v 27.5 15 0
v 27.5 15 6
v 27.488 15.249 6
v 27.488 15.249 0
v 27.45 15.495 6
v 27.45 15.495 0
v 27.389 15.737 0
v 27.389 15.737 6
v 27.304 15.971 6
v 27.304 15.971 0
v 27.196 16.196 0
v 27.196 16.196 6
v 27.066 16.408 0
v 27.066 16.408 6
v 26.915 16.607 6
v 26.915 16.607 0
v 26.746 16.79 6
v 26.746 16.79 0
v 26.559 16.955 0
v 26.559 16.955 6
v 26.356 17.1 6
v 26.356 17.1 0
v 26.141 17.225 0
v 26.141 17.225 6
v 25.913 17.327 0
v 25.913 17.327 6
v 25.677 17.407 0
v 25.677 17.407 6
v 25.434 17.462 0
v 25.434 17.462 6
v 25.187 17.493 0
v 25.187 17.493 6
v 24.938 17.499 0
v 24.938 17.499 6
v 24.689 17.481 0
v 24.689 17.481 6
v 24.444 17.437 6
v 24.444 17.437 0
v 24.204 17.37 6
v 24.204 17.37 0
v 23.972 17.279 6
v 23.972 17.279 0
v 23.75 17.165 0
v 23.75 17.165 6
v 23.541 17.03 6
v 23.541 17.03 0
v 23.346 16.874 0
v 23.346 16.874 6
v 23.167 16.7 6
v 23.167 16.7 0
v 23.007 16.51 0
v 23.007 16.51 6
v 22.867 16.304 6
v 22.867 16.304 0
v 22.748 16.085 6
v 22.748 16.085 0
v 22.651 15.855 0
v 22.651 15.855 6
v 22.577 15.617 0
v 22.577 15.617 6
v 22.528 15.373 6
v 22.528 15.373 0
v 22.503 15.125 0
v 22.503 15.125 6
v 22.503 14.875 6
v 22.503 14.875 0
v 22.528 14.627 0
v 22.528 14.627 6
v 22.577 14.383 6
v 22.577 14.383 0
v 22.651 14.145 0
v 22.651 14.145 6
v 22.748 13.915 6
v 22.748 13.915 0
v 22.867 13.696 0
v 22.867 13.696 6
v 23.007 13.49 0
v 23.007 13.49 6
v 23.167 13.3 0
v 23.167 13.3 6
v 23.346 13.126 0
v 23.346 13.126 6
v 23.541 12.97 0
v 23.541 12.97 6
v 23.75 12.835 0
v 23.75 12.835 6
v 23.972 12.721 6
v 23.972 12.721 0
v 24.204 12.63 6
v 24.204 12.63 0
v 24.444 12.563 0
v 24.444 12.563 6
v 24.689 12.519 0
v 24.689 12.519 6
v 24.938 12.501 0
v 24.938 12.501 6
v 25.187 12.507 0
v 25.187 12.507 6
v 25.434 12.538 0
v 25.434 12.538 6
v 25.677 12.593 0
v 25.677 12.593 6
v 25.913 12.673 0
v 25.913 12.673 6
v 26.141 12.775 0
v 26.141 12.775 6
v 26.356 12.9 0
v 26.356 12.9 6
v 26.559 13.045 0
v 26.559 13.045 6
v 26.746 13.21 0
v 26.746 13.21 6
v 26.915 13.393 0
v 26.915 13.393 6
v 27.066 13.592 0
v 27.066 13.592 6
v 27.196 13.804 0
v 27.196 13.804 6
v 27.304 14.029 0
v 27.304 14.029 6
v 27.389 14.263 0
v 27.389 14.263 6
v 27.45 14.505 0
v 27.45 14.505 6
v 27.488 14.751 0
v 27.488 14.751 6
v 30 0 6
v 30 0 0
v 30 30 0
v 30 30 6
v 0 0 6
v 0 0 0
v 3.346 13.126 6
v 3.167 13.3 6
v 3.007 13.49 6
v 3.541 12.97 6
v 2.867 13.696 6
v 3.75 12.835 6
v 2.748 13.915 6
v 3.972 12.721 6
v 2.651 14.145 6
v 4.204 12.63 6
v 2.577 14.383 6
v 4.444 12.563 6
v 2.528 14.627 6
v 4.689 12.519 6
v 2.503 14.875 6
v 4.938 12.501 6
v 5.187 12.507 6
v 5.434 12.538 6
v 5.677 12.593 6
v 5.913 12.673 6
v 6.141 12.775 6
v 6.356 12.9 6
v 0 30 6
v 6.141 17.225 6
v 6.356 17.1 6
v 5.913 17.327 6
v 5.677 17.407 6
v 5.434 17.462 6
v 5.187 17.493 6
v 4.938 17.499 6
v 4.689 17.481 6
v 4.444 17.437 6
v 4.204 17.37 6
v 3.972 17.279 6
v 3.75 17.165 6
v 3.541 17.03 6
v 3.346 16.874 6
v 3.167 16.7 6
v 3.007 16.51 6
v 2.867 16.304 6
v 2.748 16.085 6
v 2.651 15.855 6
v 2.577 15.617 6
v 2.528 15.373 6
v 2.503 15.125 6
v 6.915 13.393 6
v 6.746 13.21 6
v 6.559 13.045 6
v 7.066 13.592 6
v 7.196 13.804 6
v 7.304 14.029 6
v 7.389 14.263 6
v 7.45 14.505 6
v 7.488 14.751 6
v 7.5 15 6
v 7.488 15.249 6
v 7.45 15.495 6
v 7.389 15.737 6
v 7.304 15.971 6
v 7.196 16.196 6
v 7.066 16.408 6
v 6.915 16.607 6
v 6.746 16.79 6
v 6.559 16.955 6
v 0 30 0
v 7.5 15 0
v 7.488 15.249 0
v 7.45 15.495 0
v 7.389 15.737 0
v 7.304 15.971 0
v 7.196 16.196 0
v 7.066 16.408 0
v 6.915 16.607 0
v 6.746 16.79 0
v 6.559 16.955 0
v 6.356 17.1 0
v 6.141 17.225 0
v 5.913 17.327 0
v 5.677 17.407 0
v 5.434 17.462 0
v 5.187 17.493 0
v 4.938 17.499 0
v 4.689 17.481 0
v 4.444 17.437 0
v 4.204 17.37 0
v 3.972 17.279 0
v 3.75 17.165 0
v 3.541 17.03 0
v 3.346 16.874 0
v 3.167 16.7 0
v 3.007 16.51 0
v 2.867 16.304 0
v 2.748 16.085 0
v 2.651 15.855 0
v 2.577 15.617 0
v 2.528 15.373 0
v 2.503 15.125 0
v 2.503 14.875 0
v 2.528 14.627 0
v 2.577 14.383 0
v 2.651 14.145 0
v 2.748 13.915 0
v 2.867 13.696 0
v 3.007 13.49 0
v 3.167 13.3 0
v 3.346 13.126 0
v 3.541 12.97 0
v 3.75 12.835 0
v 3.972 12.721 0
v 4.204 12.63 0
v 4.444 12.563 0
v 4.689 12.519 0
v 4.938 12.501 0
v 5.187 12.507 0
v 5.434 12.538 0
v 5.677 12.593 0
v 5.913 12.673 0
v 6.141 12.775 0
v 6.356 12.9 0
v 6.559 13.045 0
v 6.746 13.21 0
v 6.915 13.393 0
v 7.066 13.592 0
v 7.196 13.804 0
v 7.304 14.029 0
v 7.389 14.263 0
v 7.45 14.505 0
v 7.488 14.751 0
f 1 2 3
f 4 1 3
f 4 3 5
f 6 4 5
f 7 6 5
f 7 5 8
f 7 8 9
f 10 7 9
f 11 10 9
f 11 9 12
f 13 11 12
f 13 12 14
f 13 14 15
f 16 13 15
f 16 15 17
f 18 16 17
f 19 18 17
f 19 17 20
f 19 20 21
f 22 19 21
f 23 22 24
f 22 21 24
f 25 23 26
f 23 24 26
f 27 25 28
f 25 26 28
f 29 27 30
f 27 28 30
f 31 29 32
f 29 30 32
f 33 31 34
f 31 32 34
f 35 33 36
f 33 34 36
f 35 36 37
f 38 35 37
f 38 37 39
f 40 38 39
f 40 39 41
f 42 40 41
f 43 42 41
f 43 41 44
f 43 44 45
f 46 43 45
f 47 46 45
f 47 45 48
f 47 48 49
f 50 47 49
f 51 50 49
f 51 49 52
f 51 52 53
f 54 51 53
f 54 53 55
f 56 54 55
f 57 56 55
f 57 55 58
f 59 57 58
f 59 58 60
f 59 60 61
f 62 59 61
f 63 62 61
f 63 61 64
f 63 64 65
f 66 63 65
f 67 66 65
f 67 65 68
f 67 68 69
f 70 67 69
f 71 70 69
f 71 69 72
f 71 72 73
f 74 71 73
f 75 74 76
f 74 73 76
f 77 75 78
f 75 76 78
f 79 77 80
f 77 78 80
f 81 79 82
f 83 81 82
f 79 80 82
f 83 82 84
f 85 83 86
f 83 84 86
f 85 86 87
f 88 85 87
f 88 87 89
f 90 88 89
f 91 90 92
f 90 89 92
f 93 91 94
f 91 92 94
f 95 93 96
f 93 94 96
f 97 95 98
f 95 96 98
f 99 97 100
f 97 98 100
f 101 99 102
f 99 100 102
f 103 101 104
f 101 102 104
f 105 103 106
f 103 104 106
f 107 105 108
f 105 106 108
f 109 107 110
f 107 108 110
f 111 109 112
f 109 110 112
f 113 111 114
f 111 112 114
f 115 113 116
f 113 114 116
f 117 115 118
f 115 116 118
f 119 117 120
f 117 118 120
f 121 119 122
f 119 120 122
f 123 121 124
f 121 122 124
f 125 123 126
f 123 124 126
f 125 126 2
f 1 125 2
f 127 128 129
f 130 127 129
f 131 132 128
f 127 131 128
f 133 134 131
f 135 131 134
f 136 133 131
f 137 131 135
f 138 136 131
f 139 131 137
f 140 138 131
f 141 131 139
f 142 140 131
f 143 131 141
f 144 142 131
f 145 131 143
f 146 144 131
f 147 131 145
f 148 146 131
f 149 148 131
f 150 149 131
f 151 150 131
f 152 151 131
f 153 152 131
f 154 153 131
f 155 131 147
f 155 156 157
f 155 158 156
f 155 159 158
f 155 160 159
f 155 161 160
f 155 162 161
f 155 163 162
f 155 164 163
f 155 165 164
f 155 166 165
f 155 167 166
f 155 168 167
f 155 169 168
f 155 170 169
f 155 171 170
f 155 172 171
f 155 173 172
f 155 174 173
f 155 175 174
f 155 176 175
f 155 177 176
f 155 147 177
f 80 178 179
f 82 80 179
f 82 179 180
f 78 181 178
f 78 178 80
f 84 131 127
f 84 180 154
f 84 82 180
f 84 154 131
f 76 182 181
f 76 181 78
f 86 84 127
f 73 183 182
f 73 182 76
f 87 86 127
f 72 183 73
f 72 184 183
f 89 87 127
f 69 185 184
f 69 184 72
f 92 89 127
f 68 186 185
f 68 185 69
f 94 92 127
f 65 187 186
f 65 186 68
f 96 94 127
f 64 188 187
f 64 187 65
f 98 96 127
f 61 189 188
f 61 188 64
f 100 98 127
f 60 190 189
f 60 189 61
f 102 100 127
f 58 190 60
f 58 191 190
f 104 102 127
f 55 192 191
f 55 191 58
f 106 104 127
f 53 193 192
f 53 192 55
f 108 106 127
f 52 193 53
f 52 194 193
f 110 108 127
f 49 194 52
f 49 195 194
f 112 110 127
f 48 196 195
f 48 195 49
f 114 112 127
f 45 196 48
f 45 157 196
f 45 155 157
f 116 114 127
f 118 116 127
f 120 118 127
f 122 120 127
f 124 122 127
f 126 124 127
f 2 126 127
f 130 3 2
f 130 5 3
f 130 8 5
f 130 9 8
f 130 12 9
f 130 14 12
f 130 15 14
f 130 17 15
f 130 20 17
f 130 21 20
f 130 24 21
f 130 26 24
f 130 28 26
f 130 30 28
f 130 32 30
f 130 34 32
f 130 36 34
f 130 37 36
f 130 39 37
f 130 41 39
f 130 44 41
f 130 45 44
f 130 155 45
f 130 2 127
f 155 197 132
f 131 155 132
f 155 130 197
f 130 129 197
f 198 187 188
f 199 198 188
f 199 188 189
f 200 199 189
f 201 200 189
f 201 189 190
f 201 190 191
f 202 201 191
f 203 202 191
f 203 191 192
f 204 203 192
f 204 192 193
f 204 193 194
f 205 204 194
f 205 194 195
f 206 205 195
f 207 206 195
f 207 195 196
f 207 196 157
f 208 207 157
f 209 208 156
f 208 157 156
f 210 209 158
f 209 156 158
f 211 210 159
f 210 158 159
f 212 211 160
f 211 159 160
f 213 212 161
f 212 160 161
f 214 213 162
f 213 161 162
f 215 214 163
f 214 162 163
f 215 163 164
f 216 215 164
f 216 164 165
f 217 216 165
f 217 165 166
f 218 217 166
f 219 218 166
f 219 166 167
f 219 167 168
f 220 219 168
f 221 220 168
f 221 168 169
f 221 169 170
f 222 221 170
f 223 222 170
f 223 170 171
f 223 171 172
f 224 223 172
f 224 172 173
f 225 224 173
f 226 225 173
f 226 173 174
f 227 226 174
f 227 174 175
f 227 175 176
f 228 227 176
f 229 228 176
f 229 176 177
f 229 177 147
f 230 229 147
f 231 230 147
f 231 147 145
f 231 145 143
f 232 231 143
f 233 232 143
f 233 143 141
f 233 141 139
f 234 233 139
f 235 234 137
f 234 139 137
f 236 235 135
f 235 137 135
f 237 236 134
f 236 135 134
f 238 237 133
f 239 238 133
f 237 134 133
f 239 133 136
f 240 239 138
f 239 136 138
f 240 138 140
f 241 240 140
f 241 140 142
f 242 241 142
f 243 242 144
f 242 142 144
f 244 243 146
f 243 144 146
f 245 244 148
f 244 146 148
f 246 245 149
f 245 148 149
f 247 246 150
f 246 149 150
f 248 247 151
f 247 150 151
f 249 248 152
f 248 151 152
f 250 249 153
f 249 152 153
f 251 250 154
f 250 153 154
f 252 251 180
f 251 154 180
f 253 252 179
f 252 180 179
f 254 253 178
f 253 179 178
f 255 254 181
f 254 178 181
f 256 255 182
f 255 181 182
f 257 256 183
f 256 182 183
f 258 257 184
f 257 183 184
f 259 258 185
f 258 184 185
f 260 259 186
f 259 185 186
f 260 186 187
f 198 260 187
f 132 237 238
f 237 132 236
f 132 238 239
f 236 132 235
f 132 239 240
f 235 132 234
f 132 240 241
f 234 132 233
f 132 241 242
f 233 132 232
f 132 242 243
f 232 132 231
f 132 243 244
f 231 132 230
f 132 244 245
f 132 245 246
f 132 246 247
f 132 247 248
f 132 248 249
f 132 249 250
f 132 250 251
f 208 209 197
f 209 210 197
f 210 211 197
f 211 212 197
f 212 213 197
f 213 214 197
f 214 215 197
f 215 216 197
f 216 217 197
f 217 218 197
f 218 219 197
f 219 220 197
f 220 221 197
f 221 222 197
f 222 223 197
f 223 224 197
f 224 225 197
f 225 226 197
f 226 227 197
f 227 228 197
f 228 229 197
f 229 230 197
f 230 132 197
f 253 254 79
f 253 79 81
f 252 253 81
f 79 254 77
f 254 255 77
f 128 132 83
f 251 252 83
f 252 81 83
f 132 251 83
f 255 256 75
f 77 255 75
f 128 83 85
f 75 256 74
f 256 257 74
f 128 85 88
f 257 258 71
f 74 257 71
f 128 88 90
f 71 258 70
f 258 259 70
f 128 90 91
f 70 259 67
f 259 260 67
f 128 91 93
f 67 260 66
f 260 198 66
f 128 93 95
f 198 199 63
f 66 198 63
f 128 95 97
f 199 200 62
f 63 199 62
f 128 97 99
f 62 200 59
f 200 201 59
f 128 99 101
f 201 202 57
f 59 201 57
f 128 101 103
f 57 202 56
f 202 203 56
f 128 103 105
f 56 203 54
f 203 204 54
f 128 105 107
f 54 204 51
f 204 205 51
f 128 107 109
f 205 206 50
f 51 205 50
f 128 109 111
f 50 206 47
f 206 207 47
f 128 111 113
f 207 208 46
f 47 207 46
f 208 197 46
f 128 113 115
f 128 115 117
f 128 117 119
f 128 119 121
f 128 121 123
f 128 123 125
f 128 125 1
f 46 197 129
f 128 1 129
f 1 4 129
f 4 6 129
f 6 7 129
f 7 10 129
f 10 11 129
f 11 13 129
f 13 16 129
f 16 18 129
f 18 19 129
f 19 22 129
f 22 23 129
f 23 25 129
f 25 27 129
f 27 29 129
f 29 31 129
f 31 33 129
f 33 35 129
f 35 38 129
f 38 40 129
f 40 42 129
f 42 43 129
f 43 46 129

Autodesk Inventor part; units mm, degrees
ref_plane "YZ Plane" through (0, 0, 0) normal (1, 0, 0) x (0, 1, 0)
ref_plane "XZ Plane" through (0, 0, 0) normal (0, 1, 0) x (-1, 0, 0)
ref_plane "XY Plane" through (0, 0, 0) normal (0, 0, 1) x (1, 0, 0)
sketch "Sketch1" plane through (0, 0, 0) normal (0, 0, 1) x (1, 0, 0)
  point P0 (0, 0)
sketch "Sketch2" plane through (0, 0, 0) normal (0, 0, 1) x (1, 0, 0)
  line L0 (0, 0) -> (30, 0)
  line L1 (30, 0) -> (30, 30)
  line L2 (30, 30) -> (0, 30)
  line L3 (0, 30) -> (0, 0)
  dimension "d0" = 30
  dimension "d1" = 30
extrude "Extrusion1" add sketch "Sketch2" along normal blind 6
sketch "Sketch3" plane through (0, 0, 6) normal (0, 0, 1) x (1, 0, 0)
  circle A0 centre (5, 15) radius 2.5
  circle A1 centre (25, 15) radius 2.5
  line L0 (0, 0) -> (30, 0) projected
  line L1 (30, 0) -> (30, 30) projected
  line L2 (0, 30) -> (0, 0) projected
  dimension "d4" = 15
  dimension "d5" = 15
  dimension "d6" = 5
  dimension "d7" = 5
  dimension "d8" = 5
extrude "Extrusion2" cut sketch "Sketch3" against normal blind 6
properties part number "space_plate"
